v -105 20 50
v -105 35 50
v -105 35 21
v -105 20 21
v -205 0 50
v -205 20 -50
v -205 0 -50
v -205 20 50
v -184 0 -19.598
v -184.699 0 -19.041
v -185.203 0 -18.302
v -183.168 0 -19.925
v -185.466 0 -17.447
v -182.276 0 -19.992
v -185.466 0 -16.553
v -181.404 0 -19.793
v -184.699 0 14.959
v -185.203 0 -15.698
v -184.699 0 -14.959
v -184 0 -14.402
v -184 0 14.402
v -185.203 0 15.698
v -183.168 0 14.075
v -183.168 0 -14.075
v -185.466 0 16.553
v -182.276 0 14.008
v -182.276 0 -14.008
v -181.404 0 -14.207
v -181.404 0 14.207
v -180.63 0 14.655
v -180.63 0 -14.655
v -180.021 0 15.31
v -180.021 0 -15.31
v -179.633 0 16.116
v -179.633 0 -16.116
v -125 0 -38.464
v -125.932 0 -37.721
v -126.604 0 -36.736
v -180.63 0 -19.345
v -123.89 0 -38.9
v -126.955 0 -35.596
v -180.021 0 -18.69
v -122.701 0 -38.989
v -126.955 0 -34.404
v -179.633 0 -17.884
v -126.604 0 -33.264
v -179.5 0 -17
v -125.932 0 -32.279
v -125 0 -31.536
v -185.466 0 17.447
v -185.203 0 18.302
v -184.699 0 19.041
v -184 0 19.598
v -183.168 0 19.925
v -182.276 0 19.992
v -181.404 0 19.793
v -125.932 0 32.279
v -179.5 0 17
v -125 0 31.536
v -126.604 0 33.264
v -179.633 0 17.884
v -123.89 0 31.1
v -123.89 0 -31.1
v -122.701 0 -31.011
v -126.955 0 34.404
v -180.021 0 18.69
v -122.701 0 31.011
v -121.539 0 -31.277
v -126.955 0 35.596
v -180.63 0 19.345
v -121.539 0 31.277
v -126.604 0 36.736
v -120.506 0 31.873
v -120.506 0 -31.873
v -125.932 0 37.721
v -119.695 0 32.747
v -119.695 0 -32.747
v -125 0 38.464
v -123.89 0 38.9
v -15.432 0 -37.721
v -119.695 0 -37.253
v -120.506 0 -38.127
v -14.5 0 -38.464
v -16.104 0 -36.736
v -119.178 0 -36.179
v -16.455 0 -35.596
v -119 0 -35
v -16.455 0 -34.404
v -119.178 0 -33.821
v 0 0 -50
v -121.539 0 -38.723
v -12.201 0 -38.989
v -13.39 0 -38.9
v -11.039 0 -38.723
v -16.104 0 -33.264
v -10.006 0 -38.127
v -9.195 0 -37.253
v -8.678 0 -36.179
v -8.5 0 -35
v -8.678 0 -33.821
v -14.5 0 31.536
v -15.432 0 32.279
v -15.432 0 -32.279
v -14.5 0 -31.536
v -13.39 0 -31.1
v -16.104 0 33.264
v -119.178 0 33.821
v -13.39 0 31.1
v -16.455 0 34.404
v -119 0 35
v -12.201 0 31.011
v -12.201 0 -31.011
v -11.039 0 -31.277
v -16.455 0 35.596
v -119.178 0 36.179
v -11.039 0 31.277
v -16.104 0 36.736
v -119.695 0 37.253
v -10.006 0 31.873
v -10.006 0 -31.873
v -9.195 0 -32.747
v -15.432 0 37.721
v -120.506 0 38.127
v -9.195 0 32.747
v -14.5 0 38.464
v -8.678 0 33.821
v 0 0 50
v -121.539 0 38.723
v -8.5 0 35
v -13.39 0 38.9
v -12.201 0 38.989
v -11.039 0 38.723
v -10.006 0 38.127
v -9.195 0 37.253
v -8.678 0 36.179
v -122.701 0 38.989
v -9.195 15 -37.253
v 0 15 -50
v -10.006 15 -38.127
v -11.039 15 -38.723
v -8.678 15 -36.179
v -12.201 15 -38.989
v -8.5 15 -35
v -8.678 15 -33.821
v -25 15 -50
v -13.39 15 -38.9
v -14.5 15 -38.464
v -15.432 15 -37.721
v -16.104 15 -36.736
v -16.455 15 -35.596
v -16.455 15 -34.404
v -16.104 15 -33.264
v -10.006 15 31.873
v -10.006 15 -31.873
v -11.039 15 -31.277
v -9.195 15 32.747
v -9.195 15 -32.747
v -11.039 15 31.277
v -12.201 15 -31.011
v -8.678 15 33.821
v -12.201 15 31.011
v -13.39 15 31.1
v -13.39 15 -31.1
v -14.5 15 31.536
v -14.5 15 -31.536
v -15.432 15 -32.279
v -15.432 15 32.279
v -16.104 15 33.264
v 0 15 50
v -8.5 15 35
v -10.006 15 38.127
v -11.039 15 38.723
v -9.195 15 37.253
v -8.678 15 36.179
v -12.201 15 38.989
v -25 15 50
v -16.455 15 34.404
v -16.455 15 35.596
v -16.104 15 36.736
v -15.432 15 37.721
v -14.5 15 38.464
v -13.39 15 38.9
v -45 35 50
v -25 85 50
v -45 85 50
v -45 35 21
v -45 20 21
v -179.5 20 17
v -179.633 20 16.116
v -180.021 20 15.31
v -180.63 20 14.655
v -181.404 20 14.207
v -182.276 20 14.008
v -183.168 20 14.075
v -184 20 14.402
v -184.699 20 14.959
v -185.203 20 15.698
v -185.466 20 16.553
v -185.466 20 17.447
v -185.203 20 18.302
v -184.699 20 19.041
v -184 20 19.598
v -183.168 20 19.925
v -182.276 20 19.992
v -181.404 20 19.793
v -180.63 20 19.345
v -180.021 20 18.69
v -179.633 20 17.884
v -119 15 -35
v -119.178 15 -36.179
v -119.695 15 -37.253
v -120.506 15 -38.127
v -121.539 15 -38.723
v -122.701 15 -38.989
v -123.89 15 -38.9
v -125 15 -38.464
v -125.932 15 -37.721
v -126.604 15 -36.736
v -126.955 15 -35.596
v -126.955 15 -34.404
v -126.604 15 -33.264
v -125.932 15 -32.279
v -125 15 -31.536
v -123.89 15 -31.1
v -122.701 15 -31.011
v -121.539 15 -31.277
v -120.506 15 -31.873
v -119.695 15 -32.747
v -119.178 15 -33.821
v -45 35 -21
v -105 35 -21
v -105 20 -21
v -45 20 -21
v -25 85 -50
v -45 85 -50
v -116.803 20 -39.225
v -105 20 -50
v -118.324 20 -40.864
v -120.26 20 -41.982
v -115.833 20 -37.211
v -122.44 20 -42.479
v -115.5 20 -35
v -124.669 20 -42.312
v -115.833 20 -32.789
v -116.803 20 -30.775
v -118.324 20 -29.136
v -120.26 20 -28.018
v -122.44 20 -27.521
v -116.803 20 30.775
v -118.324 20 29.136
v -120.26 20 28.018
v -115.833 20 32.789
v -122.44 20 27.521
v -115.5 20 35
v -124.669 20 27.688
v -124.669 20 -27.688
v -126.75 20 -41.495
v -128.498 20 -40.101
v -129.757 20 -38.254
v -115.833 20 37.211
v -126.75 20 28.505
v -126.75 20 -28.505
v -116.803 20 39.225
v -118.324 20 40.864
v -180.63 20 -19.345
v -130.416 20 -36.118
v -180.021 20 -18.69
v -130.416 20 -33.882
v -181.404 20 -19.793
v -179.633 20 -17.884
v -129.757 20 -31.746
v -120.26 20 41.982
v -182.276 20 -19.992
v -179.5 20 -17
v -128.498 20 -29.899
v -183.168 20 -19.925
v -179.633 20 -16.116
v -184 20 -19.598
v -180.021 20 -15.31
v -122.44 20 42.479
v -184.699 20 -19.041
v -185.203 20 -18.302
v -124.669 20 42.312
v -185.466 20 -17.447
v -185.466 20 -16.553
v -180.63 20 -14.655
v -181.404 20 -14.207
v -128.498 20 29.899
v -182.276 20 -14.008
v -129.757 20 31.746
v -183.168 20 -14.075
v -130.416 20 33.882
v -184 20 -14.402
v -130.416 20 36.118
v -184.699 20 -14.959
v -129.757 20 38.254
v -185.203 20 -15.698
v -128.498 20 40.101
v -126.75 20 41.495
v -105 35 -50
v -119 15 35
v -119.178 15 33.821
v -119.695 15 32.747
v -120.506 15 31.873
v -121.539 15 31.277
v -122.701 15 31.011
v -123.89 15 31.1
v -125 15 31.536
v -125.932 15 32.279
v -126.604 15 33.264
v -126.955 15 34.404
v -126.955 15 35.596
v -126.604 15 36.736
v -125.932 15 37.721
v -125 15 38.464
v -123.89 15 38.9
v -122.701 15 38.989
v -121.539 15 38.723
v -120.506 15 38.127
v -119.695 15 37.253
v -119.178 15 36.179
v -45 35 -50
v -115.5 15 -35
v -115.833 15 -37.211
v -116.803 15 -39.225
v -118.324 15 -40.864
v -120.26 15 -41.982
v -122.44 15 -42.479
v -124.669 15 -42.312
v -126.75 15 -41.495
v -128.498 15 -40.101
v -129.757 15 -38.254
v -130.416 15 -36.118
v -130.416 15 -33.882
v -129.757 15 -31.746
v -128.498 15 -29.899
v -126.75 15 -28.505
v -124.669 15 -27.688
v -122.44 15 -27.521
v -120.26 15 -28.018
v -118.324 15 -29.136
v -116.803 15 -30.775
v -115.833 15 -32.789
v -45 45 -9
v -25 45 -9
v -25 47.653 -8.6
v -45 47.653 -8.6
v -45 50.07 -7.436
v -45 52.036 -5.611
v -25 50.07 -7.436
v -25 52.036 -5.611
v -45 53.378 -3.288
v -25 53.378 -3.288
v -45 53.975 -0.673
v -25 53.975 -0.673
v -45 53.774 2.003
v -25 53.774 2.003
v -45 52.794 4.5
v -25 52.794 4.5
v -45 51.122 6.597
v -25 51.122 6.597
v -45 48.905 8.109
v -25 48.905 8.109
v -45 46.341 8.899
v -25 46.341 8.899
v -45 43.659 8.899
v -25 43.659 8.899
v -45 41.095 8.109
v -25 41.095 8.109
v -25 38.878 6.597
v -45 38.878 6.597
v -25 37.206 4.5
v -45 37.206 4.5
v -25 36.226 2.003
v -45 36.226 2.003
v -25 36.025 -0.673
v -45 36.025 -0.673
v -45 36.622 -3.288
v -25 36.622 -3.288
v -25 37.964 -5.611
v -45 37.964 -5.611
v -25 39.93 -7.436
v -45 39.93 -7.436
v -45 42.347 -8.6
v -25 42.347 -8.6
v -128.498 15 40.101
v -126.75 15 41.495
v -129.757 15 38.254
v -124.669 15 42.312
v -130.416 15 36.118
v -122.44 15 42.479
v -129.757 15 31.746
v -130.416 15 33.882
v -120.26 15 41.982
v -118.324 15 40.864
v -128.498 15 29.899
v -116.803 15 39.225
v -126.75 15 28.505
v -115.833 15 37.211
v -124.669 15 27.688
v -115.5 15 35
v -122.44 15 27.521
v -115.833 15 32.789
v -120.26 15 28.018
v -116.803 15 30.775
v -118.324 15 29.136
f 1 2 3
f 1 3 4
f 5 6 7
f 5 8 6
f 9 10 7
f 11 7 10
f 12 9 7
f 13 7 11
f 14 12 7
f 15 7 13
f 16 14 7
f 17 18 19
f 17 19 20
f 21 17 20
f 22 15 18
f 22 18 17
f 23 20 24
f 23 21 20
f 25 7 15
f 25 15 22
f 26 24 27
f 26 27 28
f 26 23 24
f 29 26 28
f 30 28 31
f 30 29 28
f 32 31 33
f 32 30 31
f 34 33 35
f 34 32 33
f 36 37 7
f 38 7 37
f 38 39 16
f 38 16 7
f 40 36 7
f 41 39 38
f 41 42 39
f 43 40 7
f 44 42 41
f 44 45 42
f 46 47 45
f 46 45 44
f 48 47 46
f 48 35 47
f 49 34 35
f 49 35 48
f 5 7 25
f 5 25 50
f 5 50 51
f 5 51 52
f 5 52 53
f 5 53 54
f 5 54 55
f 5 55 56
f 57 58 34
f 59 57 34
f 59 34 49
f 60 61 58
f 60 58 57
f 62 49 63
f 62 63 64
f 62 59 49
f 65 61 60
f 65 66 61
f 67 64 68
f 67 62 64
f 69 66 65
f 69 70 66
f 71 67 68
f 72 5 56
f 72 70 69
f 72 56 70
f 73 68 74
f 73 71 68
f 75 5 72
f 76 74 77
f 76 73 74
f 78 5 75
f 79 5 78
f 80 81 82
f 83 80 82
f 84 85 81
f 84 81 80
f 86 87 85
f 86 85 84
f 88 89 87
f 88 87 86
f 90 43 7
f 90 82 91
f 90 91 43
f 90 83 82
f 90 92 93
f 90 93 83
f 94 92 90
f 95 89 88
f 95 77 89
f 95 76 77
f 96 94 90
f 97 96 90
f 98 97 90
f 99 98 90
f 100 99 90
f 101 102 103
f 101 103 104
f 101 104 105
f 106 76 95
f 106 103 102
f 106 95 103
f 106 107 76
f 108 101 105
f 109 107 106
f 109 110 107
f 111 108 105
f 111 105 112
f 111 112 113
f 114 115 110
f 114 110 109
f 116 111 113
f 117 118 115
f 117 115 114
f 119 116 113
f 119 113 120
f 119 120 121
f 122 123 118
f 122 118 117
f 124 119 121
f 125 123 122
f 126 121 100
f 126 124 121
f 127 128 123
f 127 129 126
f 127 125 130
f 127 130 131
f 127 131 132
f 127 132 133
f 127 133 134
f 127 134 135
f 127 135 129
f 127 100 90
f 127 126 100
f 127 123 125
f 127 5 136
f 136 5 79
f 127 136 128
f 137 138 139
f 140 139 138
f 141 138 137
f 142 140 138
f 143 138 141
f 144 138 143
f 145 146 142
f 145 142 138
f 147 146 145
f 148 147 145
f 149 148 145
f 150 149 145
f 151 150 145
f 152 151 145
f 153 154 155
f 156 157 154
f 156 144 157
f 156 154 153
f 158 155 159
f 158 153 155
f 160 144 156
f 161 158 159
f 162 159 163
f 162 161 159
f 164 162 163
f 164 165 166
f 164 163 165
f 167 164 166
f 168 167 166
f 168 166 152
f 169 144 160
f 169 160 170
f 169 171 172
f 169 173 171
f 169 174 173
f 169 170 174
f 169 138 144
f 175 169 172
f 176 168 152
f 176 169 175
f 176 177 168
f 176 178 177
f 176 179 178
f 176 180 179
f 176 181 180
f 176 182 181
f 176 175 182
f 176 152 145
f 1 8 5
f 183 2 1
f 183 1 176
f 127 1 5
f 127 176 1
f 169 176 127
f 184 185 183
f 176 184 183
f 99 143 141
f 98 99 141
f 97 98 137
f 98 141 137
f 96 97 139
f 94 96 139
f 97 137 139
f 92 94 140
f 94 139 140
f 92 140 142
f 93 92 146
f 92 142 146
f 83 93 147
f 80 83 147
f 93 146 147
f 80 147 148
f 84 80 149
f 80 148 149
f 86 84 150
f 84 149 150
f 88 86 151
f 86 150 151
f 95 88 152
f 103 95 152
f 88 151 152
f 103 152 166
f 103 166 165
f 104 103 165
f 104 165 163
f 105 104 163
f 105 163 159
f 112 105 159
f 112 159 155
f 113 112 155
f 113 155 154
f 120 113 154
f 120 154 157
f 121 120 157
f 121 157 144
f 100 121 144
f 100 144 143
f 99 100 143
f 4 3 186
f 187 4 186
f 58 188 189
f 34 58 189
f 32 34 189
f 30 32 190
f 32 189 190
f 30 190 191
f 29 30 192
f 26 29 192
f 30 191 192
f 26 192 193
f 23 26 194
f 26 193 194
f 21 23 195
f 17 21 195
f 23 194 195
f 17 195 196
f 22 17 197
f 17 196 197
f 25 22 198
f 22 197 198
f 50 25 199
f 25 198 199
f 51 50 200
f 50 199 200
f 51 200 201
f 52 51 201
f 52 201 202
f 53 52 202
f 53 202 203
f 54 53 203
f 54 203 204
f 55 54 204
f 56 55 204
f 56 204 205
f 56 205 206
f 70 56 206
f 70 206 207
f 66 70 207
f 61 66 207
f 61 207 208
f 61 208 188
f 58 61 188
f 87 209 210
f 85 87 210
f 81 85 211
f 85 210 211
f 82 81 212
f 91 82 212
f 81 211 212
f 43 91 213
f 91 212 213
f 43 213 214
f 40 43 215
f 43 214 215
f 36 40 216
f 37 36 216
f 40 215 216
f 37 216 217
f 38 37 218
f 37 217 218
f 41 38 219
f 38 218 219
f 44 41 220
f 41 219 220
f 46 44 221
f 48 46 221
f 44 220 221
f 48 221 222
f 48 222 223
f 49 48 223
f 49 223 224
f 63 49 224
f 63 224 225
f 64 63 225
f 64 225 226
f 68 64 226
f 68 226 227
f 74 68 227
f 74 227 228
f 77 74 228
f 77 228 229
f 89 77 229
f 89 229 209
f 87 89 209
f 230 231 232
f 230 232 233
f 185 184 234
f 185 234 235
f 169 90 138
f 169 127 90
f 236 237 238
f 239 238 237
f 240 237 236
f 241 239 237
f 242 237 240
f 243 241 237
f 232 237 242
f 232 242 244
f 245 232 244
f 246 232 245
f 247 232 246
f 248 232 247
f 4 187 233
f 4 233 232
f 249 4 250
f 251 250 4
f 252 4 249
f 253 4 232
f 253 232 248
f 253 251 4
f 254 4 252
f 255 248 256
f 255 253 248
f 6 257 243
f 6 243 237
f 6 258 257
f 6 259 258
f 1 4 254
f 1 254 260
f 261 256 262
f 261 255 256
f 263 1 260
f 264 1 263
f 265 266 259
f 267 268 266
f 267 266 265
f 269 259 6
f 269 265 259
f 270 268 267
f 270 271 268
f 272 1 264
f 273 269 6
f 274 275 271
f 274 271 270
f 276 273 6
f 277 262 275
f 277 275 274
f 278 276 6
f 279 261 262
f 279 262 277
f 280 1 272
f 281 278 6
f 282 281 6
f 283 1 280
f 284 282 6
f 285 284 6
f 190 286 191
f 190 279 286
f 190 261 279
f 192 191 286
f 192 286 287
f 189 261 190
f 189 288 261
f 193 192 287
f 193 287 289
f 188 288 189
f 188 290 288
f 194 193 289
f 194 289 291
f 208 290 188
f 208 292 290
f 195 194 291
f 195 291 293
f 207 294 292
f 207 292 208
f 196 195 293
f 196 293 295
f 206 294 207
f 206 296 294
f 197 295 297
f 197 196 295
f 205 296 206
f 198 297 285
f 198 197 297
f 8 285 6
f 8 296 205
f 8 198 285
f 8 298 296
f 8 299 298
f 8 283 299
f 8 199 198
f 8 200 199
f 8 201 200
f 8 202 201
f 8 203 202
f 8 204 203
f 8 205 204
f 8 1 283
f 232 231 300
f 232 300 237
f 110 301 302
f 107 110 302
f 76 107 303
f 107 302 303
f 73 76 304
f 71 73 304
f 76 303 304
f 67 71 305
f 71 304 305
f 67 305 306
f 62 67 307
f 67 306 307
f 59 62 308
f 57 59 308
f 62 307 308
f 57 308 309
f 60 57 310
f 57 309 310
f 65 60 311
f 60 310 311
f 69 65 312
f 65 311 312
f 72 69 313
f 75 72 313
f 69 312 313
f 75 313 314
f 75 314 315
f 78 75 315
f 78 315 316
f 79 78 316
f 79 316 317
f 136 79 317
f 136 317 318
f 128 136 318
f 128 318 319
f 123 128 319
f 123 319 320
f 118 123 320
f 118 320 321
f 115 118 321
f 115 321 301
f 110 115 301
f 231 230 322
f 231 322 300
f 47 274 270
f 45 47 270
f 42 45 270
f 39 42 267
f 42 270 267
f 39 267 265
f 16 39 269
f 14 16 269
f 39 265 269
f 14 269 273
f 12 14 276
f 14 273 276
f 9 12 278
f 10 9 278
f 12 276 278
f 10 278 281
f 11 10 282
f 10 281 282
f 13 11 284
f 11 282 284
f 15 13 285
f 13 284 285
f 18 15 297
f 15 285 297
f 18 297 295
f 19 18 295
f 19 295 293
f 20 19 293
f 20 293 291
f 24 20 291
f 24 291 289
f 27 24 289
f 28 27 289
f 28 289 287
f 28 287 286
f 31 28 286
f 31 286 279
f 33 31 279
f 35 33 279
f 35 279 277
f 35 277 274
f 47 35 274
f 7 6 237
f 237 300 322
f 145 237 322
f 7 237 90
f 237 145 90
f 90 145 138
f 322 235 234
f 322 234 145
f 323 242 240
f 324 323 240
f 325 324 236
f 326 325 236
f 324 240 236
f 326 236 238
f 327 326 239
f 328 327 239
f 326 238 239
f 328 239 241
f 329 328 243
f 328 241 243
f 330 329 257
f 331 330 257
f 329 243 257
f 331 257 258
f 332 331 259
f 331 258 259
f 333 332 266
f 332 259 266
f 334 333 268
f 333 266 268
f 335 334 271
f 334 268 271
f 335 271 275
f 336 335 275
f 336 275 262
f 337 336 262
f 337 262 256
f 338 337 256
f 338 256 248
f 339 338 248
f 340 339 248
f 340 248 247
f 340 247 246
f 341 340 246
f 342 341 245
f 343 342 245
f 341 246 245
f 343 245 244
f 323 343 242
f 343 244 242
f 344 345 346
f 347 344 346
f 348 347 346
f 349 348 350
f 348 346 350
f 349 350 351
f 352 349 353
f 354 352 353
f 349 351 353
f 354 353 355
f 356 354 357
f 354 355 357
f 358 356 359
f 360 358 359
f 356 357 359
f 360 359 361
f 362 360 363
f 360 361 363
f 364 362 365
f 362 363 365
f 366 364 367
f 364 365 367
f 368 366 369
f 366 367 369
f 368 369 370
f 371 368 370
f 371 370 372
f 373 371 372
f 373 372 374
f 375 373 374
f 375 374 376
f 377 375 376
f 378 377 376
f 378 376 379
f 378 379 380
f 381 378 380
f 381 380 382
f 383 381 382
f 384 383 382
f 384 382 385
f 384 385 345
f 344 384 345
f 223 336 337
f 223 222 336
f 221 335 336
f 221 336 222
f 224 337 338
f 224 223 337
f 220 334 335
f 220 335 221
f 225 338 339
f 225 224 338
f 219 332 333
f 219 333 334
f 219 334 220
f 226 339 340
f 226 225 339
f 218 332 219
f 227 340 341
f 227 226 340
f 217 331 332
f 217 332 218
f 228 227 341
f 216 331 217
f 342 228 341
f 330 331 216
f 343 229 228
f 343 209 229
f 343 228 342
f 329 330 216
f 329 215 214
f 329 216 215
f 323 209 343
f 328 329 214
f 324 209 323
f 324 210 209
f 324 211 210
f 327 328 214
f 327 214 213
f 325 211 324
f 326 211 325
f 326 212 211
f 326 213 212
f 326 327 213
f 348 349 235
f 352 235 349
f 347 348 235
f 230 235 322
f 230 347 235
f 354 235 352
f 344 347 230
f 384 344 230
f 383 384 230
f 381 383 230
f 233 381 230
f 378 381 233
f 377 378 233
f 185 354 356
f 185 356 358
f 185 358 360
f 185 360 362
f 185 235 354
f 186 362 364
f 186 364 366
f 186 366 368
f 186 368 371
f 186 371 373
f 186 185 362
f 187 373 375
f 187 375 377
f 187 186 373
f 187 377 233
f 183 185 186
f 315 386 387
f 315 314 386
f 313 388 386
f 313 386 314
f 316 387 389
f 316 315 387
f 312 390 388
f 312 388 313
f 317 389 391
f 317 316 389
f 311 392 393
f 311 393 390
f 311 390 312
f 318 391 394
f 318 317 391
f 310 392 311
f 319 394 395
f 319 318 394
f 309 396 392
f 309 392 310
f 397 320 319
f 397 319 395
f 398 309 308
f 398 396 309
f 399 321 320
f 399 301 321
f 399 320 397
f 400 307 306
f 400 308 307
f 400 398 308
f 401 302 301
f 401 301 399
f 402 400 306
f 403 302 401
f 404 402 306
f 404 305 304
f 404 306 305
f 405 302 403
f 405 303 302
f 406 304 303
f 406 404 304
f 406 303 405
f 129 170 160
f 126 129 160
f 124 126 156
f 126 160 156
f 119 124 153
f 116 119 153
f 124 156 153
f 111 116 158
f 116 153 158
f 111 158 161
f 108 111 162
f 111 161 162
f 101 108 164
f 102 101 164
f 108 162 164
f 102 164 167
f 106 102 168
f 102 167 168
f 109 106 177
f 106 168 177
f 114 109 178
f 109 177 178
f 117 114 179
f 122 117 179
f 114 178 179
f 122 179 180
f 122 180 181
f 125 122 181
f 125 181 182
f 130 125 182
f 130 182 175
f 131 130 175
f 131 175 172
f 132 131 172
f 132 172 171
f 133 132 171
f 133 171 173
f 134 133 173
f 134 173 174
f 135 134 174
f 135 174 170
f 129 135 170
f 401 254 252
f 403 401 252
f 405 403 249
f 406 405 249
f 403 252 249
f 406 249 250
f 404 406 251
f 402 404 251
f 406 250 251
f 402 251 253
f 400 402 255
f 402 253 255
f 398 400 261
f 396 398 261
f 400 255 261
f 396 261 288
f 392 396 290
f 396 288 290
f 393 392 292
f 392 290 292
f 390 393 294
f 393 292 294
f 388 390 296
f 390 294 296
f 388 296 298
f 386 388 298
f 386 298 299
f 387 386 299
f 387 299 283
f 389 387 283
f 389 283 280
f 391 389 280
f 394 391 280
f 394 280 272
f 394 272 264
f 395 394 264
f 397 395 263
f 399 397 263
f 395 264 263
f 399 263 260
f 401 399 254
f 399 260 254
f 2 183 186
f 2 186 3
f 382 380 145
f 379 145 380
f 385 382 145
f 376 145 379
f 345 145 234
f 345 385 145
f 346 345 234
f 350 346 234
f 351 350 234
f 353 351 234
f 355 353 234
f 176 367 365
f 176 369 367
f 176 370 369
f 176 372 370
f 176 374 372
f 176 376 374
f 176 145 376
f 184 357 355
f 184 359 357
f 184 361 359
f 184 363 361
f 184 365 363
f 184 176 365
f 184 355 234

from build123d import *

# Parameters (mm, degrees)
BOSS_EXTRUDE1_DEPTH     = 50
SKETCH2_R               = 9
CUT_EXTRUDE1_DEPTH      = 26
CUT_EXTRUDE1_DEPTH_BACK = 181
SKETCH3_W               = 60
SKETCH3_H               = 42
CUT_EXTRUDE2_DEPTH      = 15
SKETCH4_R               = 3
SKETCH4_R_2             = 4
CUT_EXTRUDE3_DEPTH      = 21
SKETCH4_3_R             = 7.5
CUT_EXTRUDE4_DEPTH      = 5


with BuildPart() as part:
    # Sketch1 → Boss-Extrude1 (new body, symmetric)
    with BuildSketch(Plane.XY):
        Polygon((0, 0), (0, 15), (-25, 15), (-25, 85), (-45, 85), (-45, 35), (-105, 35), (-105, 20), (-205, 20), (-205, 0), align=None)
    extrude(amount=BOSS_EXTRUDE1_DEPTH, both=True)

    # Sketch2 → Cut-Extrude1 (cut, two sides)
    with BuildSketch(Plane(origin=(-25, 0, 0), x_dir=(0, 0, -1), z_dir=(1, 0, 0))) as cut_extrude1_sk:
        with Locations((0, 45)):
            Circle(SKETCH2_R)
    extrude(amount=CUT_EXTRUDE1_DEPTH, mode=Mode.SUBTRACT)
    extrude(cut_extrude1_sk.sketch, amount=-CUT_EXTRUDE1_DEPTH_BACK, mode=Mode.SUBTRACT)

    # Sketch3 → Cut-Extrude2 (cut)
    with BuildSketch(Plane(origin=(0, 35, 0), x_dir=(1, 0, 0), z_dir=(0, 1, 0))):
        with Locations((-75, 0)):
            Rectangle(SKETCH3_W, SKETCH3_H)
    extrude(amount=-CUT_EXTRUDE2_DEPTH, mode=Mode.SUBTRACT)

    # Sketch4 → Cut-Extrude3 (cut, through all)
    with BuildSketch(Plane(origin=(0, 20, 0), x_dir=(1, 0, 0), z_dir=(0, 1, 0))):
        with Locations((-182.5, 17)):
            Circle(SKETCH4_R)
        with Locations((-123, 35)):
            Circle(SKETCH4_R_2)
        with Locations((-12.5, 35)):
            Circle(SKETCH4_R_2)
        with Locations((-12.5, -35)):
            Circle(SKETCH4_R_2)
        with Locations((-123, -35)):
            Circle(SKETCH4_R_2)
        with Locations((-182.5, -17)):
            Circle(SKETCH4_R)
    extrude(amount=-CUT_EXTRUDE3_DEPTH, mode=Mode.SUBTRACT)

    # Sketch4_3 → Cut-Extrude4 (cut)
    with BuildSketch(Plane(origin=(0, 20, 0), x_dir=(1, 0, 0), z_dir=(0, 1, 0))):
        with Locations((-123, 35)):
            Circle(SKETCH4_3_R)
        with Locations((-12.5, 35)):
            Circle(SKETCH4_3_R)
        with Locations((-12.5, -35)):
            Circle(SKETCH4_3_R)
        with Locations((-123, -35)):
            Circle(SKETCH4_3_R)
    extrude(amount=-CUT_EXTRUDE4_DEPTH, mode=Mode.SUBTRACT)


solid = part.part
